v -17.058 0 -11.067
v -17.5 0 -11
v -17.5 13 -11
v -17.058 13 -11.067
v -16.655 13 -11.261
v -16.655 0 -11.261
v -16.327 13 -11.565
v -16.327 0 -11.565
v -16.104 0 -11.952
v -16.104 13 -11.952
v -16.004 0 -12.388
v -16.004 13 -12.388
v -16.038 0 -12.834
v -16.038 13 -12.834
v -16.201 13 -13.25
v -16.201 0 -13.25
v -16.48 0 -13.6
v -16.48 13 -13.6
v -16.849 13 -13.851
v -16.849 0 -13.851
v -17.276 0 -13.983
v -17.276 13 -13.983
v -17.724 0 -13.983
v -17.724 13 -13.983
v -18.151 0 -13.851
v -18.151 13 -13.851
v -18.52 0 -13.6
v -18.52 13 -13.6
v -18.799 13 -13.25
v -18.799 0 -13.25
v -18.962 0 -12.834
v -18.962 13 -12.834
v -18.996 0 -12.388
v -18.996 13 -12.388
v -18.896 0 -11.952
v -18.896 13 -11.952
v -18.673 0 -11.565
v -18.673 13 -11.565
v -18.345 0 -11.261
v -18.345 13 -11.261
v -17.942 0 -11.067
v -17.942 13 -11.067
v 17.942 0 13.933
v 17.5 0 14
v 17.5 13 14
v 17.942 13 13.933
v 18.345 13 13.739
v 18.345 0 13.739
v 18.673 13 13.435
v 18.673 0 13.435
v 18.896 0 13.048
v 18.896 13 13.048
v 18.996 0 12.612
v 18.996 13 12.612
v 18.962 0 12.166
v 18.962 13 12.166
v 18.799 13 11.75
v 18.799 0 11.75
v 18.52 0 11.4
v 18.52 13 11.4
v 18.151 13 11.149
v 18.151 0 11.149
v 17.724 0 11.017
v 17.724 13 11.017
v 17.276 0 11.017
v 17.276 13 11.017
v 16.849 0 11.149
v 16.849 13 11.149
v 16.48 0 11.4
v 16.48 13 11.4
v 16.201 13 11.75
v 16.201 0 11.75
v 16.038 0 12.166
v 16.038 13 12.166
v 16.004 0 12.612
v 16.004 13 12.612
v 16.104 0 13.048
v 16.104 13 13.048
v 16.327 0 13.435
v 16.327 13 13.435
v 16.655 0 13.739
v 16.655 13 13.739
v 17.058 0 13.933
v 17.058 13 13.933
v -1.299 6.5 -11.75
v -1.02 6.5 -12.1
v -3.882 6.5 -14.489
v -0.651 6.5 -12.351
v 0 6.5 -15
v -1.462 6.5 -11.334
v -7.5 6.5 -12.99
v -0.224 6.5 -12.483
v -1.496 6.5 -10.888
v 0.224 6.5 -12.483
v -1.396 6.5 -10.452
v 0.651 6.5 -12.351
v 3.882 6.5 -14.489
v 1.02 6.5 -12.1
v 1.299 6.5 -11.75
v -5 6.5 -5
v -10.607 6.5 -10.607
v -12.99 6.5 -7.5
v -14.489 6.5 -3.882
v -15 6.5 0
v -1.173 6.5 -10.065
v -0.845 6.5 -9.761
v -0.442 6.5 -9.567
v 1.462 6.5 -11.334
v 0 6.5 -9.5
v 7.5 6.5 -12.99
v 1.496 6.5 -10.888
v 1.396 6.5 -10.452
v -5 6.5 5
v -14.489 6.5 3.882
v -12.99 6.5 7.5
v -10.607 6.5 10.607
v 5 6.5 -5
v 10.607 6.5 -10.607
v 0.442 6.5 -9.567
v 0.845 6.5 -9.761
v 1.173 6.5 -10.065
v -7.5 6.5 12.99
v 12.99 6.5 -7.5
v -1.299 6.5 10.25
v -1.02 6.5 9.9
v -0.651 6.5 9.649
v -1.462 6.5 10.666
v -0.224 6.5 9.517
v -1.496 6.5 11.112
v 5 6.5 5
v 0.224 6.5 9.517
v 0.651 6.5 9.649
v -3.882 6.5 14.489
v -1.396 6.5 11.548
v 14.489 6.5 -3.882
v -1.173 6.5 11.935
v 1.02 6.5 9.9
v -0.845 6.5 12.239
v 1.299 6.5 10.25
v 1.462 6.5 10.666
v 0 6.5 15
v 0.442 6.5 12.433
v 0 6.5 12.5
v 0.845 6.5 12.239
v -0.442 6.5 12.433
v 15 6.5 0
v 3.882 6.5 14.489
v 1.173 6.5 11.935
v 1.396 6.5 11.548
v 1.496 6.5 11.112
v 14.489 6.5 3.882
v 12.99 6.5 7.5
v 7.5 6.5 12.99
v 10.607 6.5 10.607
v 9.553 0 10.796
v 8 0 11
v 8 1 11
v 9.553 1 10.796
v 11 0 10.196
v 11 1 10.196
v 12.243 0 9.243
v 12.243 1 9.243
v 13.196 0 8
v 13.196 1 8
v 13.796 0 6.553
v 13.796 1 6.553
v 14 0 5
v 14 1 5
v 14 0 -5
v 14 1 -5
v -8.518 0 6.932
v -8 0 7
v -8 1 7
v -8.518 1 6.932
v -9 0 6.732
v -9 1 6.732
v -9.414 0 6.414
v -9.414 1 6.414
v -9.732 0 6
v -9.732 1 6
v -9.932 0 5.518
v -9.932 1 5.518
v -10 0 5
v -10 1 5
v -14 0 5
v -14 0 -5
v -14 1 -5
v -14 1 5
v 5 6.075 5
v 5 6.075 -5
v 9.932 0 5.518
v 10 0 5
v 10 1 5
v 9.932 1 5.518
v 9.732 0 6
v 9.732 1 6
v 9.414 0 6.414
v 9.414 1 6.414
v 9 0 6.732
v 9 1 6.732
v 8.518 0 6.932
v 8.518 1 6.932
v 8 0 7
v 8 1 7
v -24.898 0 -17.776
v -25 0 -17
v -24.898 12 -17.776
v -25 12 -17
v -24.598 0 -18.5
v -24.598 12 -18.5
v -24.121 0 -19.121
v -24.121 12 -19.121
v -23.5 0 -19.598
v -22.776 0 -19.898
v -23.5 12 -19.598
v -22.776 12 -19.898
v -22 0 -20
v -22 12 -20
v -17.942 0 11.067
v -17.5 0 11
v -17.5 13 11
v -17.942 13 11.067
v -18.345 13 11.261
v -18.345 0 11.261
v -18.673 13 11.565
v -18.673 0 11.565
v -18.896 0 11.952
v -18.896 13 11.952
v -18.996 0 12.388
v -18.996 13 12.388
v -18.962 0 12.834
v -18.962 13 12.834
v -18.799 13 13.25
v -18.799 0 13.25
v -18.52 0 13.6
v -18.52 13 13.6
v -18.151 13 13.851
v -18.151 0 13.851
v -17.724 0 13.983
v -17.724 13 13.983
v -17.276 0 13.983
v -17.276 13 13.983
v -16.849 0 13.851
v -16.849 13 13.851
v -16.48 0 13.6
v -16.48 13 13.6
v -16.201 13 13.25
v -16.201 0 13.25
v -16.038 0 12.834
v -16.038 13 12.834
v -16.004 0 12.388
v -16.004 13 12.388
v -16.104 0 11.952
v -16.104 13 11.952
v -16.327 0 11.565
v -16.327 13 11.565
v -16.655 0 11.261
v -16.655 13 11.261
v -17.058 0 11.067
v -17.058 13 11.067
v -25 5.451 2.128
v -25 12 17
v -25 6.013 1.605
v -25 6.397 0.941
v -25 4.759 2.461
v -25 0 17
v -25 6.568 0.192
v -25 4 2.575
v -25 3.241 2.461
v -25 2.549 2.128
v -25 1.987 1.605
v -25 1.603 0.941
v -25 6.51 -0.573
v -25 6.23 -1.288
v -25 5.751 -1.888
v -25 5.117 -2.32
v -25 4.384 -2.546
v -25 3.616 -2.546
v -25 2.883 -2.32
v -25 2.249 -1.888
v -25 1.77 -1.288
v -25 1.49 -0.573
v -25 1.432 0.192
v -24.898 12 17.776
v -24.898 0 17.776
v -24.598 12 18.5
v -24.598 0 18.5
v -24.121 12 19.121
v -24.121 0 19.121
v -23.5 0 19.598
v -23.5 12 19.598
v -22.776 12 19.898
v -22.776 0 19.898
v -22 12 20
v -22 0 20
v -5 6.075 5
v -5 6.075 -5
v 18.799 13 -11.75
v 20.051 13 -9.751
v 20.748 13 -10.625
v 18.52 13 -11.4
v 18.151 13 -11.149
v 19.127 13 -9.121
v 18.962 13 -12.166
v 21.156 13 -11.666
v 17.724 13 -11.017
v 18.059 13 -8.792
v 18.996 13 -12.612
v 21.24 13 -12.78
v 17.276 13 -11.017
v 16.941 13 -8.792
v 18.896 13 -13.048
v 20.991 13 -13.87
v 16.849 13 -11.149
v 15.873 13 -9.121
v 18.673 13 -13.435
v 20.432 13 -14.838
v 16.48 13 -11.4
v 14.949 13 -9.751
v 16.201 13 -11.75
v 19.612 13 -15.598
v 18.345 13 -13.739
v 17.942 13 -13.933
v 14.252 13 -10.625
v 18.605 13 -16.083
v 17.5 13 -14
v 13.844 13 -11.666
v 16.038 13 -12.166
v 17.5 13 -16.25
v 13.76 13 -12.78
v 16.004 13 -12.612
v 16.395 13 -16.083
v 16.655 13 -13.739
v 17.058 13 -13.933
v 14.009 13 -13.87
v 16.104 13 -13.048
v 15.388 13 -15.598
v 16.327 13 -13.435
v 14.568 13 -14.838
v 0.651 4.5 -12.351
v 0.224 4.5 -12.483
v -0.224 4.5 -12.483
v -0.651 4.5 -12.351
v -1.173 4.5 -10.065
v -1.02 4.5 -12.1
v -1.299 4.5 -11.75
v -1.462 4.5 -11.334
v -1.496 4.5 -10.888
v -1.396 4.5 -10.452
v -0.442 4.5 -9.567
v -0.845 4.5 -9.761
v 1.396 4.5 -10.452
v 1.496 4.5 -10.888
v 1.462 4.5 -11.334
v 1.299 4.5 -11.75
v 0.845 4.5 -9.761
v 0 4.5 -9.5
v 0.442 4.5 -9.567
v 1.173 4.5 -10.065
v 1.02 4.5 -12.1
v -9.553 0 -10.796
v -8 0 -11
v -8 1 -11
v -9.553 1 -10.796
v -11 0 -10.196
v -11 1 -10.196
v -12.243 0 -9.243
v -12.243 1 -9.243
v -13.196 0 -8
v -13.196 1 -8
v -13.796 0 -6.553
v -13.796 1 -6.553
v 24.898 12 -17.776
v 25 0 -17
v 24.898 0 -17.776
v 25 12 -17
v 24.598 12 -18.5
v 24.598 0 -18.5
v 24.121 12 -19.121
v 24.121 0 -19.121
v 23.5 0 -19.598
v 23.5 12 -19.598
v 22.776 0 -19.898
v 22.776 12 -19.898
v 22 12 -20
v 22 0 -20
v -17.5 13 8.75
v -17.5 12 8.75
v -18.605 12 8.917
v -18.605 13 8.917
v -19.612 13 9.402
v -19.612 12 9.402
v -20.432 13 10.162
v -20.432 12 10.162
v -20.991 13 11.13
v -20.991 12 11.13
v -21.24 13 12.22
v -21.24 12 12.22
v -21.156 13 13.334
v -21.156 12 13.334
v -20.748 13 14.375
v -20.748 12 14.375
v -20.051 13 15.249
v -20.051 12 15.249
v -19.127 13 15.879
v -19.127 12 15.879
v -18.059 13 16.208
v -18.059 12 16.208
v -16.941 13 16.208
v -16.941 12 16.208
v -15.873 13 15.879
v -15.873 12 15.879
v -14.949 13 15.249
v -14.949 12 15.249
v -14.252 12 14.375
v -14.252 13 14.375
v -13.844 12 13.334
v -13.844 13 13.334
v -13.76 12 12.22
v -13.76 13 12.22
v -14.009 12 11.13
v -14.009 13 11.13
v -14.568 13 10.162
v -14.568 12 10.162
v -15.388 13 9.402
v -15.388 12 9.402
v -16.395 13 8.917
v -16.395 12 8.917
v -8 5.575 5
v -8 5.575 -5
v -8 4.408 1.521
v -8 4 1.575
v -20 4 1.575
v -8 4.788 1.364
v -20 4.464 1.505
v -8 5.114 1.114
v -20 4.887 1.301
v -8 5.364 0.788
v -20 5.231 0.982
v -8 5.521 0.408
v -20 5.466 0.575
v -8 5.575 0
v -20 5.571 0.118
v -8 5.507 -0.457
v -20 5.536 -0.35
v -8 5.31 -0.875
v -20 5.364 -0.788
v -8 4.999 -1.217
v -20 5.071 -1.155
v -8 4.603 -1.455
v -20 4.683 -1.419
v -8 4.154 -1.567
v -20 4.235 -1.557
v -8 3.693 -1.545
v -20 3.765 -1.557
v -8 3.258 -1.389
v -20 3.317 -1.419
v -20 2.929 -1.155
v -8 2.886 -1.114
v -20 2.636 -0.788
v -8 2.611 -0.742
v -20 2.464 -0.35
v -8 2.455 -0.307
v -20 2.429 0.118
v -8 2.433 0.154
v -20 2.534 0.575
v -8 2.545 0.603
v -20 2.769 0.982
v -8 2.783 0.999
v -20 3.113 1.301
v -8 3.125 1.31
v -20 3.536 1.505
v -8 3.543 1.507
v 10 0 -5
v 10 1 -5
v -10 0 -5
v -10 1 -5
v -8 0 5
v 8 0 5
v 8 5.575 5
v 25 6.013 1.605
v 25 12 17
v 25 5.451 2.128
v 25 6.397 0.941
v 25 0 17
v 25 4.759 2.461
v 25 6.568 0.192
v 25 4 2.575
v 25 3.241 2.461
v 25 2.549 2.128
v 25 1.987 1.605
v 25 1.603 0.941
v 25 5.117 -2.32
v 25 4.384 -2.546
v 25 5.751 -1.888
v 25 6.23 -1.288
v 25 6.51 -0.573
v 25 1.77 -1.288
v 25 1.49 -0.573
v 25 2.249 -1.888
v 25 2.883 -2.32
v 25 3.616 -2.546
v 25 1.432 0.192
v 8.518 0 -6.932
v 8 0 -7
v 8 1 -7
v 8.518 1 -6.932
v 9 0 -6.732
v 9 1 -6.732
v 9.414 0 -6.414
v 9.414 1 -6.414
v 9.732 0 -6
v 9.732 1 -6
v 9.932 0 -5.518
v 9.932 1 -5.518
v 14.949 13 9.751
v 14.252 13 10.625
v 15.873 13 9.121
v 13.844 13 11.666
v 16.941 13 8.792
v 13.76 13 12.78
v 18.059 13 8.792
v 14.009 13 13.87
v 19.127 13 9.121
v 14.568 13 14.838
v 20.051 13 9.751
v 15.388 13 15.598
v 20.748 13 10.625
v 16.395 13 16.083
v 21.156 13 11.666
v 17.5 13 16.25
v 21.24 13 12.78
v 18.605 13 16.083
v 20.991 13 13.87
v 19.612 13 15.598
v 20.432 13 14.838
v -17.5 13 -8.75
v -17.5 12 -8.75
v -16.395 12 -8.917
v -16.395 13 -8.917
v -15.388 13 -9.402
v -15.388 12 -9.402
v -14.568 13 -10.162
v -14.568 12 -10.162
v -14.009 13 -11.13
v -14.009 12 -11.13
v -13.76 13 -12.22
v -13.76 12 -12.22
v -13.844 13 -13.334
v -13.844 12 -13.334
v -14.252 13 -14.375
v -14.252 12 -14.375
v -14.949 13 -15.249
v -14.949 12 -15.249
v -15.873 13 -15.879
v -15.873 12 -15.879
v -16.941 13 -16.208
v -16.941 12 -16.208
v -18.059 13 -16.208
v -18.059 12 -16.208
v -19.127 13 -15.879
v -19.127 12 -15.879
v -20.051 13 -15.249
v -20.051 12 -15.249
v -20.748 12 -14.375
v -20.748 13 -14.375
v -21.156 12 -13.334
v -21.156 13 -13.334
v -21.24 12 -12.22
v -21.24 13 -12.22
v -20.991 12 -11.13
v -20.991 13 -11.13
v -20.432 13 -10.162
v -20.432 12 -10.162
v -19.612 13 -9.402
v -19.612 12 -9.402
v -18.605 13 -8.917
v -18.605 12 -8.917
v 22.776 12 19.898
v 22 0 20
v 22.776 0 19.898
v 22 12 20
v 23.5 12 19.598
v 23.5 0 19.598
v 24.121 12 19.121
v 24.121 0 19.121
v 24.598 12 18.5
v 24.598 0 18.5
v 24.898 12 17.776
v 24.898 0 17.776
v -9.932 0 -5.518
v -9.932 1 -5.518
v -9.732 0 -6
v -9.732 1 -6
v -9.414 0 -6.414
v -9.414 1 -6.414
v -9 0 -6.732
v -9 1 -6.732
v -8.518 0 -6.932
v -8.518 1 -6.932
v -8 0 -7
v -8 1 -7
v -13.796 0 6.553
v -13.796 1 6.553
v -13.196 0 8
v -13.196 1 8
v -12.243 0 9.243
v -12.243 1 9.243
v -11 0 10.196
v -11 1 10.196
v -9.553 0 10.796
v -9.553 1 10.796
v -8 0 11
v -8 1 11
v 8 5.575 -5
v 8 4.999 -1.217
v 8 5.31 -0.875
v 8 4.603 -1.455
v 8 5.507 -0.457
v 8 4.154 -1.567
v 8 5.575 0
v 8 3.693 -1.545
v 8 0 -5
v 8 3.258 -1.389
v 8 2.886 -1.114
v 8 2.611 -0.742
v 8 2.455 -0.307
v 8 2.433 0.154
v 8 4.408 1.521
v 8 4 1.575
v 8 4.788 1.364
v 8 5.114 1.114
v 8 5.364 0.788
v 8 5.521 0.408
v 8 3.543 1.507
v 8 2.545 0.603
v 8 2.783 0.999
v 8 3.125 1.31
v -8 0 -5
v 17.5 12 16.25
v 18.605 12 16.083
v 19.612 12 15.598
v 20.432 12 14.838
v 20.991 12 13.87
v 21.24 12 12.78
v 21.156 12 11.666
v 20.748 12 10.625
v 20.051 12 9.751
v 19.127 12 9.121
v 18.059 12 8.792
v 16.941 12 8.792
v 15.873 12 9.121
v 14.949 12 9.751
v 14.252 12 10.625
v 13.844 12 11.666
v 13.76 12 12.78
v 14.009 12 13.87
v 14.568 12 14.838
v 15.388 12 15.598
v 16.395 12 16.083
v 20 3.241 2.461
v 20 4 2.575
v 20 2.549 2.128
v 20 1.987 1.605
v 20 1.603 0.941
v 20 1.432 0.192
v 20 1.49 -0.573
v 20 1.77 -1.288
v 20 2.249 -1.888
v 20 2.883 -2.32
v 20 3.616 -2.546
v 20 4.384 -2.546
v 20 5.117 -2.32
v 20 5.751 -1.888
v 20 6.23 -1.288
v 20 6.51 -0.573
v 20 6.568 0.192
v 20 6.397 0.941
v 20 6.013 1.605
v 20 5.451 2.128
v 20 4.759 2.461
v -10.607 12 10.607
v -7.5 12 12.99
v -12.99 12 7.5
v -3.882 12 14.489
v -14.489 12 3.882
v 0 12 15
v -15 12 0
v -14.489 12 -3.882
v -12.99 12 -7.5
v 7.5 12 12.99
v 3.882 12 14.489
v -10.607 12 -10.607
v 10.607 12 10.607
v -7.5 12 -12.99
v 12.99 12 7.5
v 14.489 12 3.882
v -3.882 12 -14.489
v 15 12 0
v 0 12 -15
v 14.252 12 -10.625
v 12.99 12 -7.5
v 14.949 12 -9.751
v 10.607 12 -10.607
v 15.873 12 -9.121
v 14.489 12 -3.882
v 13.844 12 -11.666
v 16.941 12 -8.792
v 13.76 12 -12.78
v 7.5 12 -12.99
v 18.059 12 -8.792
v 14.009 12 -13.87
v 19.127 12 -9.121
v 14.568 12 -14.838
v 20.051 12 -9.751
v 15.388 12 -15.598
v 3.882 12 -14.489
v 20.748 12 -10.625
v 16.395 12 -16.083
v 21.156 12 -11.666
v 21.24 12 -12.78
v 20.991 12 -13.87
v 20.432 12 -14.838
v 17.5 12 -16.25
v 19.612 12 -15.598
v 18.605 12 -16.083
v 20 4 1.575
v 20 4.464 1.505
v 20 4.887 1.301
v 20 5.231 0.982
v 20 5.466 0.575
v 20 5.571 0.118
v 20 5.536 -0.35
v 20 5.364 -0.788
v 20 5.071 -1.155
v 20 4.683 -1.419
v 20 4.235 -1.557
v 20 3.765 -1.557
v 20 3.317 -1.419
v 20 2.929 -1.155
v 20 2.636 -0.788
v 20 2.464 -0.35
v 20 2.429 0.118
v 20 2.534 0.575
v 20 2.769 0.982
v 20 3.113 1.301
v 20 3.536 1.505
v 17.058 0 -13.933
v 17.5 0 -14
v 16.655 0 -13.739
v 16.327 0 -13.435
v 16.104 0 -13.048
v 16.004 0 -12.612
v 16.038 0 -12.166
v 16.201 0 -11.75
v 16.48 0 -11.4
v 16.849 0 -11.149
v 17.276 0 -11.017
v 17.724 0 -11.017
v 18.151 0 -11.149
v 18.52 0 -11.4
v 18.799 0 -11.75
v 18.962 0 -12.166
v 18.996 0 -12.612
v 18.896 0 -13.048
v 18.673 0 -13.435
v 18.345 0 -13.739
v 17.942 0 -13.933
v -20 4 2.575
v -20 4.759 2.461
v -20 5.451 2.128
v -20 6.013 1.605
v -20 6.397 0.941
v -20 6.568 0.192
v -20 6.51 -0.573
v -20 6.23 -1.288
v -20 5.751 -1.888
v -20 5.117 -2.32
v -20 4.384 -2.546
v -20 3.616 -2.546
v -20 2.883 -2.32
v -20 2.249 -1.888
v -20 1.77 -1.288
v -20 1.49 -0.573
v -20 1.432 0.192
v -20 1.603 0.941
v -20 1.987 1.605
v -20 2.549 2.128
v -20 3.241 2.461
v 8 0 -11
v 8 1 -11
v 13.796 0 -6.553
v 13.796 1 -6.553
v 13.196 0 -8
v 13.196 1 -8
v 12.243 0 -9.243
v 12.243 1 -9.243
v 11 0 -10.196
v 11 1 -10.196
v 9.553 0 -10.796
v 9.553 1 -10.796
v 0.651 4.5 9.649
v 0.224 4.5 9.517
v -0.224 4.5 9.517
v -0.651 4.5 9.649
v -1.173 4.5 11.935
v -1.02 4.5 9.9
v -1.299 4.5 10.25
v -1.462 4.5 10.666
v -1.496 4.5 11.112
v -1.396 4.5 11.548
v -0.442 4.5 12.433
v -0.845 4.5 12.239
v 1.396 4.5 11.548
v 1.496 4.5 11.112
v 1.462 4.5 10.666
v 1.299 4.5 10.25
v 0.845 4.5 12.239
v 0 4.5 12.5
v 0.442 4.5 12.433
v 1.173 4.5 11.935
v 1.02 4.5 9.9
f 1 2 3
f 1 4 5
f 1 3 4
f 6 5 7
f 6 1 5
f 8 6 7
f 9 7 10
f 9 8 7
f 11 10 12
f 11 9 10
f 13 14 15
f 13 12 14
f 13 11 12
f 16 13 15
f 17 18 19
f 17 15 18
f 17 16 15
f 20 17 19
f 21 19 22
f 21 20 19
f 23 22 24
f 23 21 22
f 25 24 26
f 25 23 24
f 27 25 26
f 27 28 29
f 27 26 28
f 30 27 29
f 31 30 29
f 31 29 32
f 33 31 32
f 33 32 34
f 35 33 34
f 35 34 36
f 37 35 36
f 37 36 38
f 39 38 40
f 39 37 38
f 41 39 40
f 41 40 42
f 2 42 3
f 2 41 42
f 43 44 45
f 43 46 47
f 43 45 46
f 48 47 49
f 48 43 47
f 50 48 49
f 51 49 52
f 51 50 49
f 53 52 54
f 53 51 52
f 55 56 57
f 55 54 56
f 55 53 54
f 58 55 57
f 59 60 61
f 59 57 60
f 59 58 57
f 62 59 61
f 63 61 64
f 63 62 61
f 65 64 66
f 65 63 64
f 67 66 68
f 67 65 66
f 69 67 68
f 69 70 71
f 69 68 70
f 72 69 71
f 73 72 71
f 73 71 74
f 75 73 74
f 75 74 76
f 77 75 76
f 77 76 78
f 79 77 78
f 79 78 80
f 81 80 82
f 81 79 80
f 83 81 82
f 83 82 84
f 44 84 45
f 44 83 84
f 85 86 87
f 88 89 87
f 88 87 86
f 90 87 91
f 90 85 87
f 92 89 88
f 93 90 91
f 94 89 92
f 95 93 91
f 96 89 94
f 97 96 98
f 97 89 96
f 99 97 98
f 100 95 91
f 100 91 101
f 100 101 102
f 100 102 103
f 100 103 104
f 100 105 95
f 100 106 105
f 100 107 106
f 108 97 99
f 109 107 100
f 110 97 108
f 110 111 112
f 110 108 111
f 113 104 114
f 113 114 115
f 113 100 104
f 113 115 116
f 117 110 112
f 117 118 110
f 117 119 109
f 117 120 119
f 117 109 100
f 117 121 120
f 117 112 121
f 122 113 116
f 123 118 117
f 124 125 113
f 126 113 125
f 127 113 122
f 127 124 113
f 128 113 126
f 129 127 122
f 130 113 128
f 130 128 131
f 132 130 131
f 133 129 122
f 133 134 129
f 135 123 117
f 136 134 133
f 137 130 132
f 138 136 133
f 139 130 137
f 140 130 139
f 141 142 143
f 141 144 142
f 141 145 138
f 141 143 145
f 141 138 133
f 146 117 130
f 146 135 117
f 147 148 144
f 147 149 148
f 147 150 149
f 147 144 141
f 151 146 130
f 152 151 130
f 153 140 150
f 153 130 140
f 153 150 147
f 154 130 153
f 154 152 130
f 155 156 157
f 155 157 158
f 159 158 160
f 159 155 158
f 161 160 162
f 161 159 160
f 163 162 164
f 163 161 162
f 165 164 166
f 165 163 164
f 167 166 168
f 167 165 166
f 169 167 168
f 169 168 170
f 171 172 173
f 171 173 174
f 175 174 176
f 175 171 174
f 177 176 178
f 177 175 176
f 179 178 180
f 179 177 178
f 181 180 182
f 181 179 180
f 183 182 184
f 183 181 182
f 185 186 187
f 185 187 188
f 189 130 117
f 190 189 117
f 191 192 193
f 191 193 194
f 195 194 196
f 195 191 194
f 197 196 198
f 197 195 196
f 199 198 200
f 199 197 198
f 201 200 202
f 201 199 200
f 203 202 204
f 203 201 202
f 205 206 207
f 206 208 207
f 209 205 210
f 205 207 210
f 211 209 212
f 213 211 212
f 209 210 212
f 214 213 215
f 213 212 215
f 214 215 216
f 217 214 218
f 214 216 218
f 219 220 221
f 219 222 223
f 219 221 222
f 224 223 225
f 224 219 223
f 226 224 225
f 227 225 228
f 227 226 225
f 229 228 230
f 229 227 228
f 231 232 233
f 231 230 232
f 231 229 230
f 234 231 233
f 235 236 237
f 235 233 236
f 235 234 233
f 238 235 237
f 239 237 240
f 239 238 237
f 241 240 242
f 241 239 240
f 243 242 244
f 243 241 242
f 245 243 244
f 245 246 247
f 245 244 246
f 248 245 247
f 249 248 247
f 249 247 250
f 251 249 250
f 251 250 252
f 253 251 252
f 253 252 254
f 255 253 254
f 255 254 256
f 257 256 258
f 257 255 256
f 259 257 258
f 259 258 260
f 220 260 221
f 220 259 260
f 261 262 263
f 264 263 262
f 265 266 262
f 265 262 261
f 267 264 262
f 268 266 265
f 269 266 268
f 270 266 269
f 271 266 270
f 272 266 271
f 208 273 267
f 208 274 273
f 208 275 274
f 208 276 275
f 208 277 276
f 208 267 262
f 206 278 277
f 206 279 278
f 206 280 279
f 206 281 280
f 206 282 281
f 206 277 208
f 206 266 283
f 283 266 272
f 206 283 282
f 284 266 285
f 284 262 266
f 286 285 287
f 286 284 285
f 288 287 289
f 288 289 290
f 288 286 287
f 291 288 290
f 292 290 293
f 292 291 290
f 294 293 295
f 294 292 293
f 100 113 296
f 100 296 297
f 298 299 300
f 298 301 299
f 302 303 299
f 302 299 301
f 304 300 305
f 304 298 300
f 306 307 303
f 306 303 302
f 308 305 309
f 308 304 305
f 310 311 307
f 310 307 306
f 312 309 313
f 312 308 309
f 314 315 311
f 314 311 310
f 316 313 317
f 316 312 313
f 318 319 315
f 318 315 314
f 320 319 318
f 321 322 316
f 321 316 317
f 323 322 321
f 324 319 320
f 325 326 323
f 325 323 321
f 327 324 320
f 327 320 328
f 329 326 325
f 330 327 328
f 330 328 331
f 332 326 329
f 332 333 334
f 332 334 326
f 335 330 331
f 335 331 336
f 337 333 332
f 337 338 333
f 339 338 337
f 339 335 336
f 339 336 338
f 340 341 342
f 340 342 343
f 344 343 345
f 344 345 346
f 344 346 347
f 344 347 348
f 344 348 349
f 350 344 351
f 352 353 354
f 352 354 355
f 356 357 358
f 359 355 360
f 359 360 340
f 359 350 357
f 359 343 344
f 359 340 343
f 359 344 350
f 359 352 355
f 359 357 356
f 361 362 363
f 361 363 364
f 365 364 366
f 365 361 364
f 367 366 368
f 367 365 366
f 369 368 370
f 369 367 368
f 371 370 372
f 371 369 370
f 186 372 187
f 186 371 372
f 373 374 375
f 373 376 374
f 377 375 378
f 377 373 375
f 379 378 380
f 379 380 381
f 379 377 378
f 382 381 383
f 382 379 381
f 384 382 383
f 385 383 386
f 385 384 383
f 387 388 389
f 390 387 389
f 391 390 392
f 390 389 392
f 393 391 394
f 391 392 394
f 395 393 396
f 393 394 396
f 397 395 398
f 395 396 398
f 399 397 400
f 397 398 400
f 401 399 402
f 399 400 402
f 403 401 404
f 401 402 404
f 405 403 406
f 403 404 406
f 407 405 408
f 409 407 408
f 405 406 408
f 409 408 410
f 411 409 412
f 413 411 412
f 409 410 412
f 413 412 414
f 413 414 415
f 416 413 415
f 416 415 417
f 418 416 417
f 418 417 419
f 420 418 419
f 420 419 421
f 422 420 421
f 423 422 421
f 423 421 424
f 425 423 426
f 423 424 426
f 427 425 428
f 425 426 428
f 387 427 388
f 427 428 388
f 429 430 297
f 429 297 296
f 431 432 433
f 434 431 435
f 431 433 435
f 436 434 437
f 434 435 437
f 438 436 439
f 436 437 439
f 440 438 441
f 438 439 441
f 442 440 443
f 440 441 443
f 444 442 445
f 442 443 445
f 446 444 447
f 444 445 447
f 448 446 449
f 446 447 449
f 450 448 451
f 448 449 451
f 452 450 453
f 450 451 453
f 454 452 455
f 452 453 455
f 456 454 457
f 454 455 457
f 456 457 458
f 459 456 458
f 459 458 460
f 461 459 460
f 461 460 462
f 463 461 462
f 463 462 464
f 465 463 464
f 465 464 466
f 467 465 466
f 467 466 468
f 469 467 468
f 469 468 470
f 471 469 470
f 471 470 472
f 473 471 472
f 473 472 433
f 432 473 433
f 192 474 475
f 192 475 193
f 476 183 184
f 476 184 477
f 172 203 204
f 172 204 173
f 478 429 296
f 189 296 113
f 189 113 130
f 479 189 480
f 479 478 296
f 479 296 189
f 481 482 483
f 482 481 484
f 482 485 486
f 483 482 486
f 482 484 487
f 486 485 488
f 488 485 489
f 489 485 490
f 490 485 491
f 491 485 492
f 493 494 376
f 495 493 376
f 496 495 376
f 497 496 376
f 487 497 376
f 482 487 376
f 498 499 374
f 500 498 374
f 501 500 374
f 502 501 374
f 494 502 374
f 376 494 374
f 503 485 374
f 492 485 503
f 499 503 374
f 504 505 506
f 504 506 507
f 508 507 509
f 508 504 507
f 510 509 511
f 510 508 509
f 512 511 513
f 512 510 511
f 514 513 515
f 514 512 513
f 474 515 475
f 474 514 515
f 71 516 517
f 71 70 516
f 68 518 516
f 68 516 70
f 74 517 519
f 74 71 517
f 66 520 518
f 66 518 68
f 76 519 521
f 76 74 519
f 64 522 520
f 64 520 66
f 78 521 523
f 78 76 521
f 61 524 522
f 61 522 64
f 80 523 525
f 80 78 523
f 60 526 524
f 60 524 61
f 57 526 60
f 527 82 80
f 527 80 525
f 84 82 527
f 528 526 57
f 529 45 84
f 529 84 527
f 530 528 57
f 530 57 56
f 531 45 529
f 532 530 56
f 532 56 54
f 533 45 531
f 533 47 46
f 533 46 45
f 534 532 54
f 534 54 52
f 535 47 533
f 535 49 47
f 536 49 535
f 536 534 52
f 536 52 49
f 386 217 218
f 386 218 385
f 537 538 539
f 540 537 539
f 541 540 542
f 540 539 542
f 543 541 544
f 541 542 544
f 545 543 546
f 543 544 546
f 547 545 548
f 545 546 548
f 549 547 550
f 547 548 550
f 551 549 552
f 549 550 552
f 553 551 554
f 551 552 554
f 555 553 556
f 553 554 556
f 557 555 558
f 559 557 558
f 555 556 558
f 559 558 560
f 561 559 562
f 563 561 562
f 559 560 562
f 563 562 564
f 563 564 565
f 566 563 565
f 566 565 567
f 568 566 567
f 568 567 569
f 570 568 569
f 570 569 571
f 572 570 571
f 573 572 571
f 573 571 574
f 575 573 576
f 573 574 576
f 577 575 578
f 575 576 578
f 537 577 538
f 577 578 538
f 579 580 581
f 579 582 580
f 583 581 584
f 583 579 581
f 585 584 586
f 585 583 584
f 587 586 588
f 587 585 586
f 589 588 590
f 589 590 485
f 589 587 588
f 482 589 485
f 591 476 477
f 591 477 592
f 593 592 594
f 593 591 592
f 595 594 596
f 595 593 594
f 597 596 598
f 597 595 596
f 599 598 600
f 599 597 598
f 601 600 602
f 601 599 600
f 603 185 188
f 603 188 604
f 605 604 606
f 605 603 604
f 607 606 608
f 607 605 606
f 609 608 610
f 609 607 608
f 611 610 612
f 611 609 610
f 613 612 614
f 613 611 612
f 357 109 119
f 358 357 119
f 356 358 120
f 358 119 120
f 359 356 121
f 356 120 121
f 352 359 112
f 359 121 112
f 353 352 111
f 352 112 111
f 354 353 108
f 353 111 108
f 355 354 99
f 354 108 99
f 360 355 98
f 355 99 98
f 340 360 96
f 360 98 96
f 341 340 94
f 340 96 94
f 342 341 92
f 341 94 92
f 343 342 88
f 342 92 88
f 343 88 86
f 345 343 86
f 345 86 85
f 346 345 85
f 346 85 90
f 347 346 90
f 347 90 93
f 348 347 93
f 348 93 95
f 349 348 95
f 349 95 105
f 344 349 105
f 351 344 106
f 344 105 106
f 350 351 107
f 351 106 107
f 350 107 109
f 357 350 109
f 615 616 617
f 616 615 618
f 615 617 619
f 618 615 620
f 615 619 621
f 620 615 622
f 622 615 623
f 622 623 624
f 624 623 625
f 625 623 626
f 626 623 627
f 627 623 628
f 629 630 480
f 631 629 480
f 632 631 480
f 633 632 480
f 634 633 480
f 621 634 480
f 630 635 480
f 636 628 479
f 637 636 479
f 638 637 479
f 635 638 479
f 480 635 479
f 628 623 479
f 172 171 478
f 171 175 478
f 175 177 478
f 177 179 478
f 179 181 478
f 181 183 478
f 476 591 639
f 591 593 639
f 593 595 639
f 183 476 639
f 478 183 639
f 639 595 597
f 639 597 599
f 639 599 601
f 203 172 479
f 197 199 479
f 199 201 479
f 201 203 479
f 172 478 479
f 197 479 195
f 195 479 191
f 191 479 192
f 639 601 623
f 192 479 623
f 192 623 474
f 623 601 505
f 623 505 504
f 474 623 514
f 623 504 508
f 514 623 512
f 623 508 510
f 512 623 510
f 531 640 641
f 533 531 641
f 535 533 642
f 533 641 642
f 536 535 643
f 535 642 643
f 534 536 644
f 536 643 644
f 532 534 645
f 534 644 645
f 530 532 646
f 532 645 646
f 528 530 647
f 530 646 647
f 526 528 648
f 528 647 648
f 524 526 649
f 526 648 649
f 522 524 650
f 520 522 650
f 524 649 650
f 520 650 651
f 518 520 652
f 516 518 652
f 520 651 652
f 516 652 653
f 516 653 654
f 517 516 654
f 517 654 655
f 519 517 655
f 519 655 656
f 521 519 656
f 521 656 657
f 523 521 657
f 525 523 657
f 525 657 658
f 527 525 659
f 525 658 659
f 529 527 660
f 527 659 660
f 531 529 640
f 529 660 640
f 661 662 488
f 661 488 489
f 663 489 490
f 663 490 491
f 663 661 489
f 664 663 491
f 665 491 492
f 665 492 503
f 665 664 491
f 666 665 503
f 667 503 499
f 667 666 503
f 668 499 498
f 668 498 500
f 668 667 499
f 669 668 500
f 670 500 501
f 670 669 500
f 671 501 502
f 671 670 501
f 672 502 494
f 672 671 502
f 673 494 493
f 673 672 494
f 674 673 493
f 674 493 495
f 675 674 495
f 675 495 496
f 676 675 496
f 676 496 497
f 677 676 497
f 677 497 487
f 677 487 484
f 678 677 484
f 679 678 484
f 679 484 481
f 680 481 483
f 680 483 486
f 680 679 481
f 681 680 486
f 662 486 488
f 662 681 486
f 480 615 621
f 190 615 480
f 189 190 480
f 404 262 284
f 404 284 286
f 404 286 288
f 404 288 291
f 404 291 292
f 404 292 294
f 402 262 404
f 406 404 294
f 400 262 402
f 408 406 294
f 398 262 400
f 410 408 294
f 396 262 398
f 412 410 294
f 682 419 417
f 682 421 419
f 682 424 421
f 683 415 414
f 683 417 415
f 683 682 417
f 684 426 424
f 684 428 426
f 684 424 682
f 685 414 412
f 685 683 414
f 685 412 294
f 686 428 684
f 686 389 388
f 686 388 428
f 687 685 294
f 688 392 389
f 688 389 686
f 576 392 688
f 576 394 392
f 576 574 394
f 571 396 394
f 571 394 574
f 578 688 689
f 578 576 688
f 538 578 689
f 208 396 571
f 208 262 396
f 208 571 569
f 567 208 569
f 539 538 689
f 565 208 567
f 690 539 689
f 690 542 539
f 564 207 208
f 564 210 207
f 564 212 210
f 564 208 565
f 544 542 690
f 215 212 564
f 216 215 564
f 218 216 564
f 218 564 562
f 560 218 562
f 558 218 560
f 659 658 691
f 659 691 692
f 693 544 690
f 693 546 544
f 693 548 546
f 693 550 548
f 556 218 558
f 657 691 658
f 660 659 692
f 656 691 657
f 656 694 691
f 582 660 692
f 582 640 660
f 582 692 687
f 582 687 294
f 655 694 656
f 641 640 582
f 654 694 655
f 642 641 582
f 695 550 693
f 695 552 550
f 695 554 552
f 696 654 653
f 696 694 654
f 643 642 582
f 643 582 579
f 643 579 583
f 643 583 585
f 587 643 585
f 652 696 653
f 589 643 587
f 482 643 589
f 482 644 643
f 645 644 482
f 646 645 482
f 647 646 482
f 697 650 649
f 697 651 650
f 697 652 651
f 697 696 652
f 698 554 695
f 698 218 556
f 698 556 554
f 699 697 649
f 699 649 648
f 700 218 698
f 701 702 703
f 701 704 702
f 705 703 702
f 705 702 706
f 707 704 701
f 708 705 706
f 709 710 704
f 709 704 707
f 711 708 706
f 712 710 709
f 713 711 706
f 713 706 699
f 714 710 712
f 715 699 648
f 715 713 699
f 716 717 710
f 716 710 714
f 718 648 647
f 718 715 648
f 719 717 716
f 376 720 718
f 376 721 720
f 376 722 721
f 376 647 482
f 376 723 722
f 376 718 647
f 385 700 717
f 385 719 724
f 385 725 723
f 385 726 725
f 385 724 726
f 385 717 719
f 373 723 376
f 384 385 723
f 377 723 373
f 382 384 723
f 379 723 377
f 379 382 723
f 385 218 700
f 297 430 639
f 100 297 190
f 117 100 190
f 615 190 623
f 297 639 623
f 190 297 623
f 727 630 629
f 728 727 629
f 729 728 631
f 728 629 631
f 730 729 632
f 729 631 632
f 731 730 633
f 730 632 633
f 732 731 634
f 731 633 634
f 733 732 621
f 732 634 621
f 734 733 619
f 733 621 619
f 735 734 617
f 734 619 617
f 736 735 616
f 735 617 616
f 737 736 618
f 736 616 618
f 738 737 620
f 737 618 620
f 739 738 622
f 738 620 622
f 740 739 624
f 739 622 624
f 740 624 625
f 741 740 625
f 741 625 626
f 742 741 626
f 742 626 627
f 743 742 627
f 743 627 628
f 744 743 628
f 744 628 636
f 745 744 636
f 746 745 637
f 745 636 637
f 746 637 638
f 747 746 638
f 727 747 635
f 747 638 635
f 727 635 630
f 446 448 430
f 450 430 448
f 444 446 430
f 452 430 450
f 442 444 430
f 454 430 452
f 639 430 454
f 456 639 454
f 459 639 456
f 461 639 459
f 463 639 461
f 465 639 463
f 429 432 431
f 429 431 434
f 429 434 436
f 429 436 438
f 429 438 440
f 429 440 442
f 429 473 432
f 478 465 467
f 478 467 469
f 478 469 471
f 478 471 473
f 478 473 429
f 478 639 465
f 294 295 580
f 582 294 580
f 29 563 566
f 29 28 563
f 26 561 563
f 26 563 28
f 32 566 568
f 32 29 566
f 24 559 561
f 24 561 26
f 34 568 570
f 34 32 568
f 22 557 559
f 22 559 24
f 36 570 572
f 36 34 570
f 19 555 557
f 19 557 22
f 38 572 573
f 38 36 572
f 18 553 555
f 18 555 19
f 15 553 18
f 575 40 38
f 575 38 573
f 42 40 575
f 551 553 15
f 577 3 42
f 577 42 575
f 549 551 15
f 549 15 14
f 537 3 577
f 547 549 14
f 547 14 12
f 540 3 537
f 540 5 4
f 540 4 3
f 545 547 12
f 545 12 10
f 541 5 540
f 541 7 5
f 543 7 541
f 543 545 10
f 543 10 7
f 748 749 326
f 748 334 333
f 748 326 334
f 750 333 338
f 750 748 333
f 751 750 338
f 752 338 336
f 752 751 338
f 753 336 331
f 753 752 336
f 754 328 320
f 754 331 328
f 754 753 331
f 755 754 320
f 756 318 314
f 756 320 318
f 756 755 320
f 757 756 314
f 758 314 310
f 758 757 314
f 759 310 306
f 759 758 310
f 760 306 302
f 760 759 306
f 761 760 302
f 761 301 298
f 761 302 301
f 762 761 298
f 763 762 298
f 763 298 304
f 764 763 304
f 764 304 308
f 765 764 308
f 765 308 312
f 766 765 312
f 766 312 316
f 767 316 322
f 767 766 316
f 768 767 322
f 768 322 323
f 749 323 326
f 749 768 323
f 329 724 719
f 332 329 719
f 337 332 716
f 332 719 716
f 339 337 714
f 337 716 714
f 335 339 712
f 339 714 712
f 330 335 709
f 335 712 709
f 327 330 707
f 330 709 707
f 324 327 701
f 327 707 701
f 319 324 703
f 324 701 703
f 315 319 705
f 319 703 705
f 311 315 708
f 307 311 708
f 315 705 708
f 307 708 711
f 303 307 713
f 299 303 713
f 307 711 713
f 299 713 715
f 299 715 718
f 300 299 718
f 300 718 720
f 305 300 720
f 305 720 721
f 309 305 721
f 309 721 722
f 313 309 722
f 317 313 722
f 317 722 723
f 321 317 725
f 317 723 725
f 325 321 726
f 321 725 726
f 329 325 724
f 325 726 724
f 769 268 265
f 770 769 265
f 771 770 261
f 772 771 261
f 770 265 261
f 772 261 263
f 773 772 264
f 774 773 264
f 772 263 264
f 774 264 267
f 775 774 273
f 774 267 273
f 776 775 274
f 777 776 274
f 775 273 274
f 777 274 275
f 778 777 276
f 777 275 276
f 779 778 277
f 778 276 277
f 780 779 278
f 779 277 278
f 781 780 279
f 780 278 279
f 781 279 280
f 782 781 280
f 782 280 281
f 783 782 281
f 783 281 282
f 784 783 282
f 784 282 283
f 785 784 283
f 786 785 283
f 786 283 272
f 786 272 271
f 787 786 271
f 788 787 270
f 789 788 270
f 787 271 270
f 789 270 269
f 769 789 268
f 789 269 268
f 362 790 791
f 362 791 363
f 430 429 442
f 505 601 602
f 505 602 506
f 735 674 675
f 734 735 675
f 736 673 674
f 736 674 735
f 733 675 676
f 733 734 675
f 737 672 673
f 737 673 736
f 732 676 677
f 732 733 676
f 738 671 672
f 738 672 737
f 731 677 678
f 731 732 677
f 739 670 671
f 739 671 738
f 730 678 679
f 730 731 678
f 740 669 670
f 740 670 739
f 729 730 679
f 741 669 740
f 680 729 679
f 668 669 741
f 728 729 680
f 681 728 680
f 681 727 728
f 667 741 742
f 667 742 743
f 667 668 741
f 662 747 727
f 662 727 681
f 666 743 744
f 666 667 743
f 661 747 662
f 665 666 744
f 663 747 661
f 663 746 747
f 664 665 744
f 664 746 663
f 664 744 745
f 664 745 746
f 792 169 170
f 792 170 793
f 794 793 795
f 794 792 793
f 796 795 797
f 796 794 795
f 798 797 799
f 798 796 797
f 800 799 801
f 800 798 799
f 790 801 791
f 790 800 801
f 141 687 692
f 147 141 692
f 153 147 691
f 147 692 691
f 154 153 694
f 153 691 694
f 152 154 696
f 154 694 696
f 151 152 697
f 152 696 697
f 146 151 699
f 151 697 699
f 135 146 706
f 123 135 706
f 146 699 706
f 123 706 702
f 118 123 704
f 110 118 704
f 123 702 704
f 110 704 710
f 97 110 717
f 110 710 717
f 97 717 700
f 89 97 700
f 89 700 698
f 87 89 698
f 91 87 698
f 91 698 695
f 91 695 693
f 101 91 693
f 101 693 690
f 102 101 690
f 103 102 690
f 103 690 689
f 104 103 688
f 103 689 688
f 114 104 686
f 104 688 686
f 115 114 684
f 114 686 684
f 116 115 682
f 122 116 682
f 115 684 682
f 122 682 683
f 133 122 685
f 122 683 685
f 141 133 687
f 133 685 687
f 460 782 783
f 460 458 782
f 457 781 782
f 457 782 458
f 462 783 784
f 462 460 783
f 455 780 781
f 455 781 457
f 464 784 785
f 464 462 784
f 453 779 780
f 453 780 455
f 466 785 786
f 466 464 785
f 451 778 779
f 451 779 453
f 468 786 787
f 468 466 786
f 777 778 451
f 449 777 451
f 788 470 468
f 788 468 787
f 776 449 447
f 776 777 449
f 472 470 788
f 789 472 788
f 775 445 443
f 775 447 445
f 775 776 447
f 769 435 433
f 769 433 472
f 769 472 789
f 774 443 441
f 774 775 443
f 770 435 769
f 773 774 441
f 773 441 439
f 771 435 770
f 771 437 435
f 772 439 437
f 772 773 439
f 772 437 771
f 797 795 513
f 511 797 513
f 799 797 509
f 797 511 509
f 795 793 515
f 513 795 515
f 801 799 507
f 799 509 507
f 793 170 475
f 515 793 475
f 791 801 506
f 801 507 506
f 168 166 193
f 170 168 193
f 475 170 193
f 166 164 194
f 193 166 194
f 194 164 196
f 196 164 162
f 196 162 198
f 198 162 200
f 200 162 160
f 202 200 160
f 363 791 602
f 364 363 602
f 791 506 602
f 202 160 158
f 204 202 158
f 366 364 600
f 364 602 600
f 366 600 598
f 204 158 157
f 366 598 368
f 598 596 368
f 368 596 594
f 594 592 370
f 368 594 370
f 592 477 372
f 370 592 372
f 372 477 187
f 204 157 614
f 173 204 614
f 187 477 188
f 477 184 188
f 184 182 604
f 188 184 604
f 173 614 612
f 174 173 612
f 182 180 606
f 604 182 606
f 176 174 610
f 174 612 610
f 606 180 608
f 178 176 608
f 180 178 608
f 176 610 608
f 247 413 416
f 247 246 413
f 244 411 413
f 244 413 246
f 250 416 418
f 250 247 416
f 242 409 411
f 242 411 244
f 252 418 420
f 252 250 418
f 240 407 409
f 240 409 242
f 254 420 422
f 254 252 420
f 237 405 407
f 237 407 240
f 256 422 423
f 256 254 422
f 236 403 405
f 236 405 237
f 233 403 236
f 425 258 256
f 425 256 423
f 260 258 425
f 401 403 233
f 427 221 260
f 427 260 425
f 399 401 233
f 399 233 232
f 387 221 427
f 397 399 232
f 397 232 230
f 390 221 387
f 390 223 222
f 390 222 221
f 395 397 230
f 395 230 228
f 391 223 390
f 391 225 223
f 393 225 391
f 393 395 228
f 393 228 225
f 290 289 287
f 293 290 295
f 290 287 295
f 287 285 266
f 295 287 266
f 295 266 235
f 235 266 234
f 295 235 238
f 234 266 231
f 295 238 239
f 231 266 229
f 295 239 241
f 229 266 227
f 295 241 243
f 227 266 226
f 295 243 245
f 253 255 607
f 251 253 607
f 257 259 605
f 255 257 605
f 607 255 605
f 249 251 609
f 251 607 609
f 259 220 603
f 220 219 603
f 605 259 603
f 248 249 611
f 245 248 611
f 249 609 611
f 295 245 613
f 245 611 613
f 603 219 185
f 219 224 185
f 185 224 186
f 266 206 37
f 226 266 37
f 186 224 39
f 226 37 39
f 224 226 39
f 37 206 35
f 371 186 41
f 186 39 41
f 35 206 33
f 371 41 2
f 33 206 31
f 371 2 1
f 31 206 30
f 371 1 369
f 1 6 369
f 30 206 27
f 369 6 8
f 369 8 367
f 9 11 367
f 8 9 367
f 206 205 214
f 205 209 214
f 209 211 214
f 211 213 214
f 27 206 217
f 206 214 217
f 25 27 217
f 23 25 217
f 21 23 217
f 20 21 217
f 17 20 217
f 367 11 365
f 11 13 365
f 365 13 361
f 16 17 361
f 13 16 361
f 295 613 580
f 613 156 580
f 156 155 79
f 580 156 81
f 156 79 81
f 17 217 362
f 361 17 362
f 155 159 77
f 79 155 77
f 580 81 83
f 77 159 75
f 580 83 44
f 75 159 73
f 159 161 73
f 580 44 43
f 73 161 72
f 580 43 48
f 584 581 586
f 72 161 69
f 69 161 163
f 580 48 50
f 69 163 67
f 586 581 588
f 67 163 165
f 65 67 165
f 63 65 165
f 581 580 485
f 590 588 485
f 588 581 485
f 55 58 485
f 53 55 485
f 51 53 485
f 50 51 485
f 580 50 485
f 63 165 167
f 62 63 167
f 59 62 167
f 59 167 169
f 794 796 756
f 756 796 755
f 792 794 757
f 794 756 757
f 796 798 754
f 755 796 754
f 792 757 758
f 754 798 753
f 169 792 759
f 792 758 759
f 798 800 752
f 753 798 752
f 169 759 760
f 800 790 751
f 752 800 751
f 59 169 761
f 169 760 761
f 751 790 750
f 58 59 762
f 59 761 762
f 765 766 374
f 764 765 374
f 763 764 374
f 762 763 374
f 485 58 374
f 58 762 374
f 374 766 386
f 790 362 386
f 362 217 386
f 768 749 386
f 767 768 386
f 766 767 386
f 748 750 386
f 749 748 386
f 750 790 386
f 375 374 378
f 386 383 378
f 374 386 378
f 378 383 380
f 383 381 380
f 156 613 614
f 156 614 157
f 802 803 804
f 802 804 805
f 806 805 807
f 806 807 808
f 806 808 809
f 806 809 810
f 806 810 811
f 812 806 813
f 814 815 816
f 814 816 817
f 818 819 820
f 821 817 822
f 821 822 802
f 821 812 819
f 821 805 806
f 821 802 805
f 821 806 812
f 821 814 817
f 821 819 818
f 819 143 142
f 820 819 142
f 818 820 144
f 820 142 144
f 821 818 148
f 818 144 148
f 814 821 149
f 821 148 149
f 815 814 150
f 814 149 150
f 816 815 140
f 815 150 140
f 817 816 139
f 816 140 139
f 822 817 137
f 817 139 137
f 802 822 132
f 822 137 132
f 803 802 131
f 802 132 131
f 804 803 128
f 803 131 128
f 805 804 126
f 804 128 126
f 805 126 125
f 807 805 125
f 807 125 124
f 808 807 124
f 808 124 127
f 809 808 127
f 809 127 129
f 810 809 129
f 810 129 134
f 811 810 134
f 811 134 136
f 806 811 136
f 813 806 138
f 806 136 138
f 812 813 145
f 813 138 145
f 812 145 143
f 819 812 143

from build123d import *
from OCP.BRepFilletAPI import BRepFilletAPI_MakeChamfer

# Parameters (mm, degrees)
SKETCH1_W           = 50
SKETCH1_H           = 40
BODY_DEPTH          = 12
FILLETBODY_R        = 3
SKETCH3_R           = 3.75
BOLT_EXTRUDE_DEPTH  = 1
BOLT_DEPTH          = 10
BOLT_DEPTH_BACK     = 16
SKETCH4_R           = 1.5
SKETCH41_R          = 1.575
CHANNEL1_DEPTH      = 57
SKETCH42_R          = 2.575
INLET_DEPTH         = 5
OUTLET_START        = -5
SKETCH43_R          = 2.575
OUTLET_DEPTH        = 5
SKETCH44_R          = 15
WINDOW_DEPTH        = 5.5
SKETCH45_W          = 16
SKETCH45_H          = 10
FLOWCH_DEPTH        = 5.575
SKETCH46_W          = 10
SKETCH46_H          = 10
WINDOW_HOLE_DEPTH   = 16
SKETCH49_R          = 1.5
FIXHOLES_DEPTH      = 2
GASKET_DEPTH        = 1
CHAMFER_FLOW_SIZE   = 0.5
CHAMFER_FLOW_SIZE_2 = 3


with BuildPart() as part:
    # Sketch1 → Body (new body)
    with BuildSketch(Plane(origin=(0, 0, 0), x_dir=(1, 0, 0), z_dir=(0, 1, 0))):
        Rectangle(SKETCH1_W, SKETCH1_H)
    extrude(amount=BODY_DEPTH)

    # FilletBody
    filletbody_edges = [part.edges().sort_by_distance(p)[0] for p in [
        (-25, 6, -20),
        (25, 6, -20),
        (25, 6, 20),
        (-25, 6, 20),
    ]]
    fillet(filletbody_edges, radius=FILLETBODY_R)

    # Sketch3 → Bolt extrude (add)
    with BuildSketch(Plane(origin=(0, 12, 0), x_dir=(1, 0, 0), z_dir=(0, 1, 0))):
        with Locations(Location((-17.5, 12.5, 0), (0, 0, 270))):
            Circle(SKETCH3_R)
        with Locations(Location((17.5, 12.5, 0), (0, 0, 90))):
            Circle(SKETCH3_R)
        with Locations(Location((17.5, -12.5, 0), (0, 0, 270))):
            Circle(SKETCH3_R)
        with Locations(Location((-17.5, -12.5, 0), (0, 0, 90))):
            Circle(SKETCH3_R)
    extrude(amount=BOLT_EXTRUDE_DEPTH)

    # Sketch4 → Bolt (cut, two sides: drawn at the far end of the back side and taken through both)
    with BuildSketch(Plane(origin=(0, 13, 0), x_dir=(1, 0, 0), z_dir=(0, 1, 0)).offset(-BOLT_DEPTH_BACK)):
        with Locations(Location((-17.5, 12.5, 0), (0, 0, 270))):
            Circle(SKETCH4_R)
        with Locations(Location((17.5, 12.5, 0), (0, 0, 90))):
            Circle(SKETCH4_R)
        with Locations(Location((17.5, -12.5, 0), (0, 0, 270))):
            Circle(SKETCH4_R)
        with Locations(Location((-17.5, -12.5, 0), (0, 0, 90))):
            Circle(SKETCH4_R)
    extrude(amount=BOLT_DEPTH + BOLT_DEPTH_BACK, mode=Mode.SUBTRACT)

    # Sketch41 → Channel1 (cut)
    with BuildSketch(Plane.ZY.offset(25)):
        with Locations((0, 4)):
            Circle(SKETCH41_R)
    extrude(amount=-CHANNEL1_DEPTH, mode=Mode.SUBTRACT)

    # Sketch42 → Inlet (cut)
    with BuildSketch(Plane.ZY.offset(25)):
        with Locations((0, 4)):
            Circle(SKETCH42_R)
    extrude(amount=-INLET_DEPTH, mode=Mode.SUBTRACT)

    # Sketch43 → Outlet (cut)
    with BuildSketch(Plane(origin=(25, 0, 0), x_dir=(0, 0, -1), z_dir=(1, 0, 0)).offset(OUTLET_START)):
        with Locations(Location((0, 4, 0), (0, 0, 180))):
            Circle(SKETCH43_R)
    extrude(amount=OUTLET_DEPTH, mode=Mode.SUBTRACT)

    # Sketch44 → Window (cut)
    with BuildSketch(Plane(origin=(0, 12, 0), x_dir=(1, 0, 0), z_dir=(0, 1, 0))):
        with Locations(Location((0, 0, 0), (0, 0, 270))):
            Circle(SKETCH44_R)
    extrude(amount=-WINDOW_DEPTH, mode=Mode.SUBTRACT)

    # Sketch45 → FlowCh (cut)
    with BuildSketch(Plane.XZ):
        Rectangle(SKETCH45_W, SKETCH45_H)
    extrude(amount=-FLOWCH_DEPTH, mode=Mode.SUBTRACT)

    # Sketch46 → Window_hole (cut)
    with BuildSketch(Plane(origin=(0, 6.5, 0), x_dir=(1, 0, 0), z_dir=(0, 1, 0))):
        Rectangle(SKETCH46_W, SKETCH46_H)
    extrude(amount=-WINDOW_HOLE_DEPTH, mode=Mode.SUBTRACT)

    # Sketch49 → FixHoles (cut)
    with BuildSketch(Plane(origin=(0, 6.5, 0), x_dir=(1, 0, 0), z_dir=(0, 1, 0))):
        with Locations(Location((0, 11, 0), (0, 0, 270))):
            Circle(SKETCH49_R)
        with Locations(Location((0, -11, 0), (0, 0, 270))):
            Circle(SKETCH49_R)
    extrude(amount=-FIXHOLES_DEPTH, mode=Mode.SUBTRACT)

    # Sketch50 → Gasket (cut)
    with BuildSketch(Plane.XZ):
        with BuildLine():
            ThreePointArc((8, 11), (12.242640687, 9.242640687), (14, 5))
            Line((14, 5), (14, -5))
            ThreePointArc((14, -5), (12.242640687, -9.242640687), (8, -11))
            Line((8, -11), (-8, -11))
            ThreePointArc((-8, -11), (-12.242640687, -9.242640687), (-14, -5))
            Line((-14, -5), (-14, 5))
            ThreePointArc((-14, 5), (-12.242640687, 9.242640687), (-8, 11))
            Line((-8, 11), (8, 11))
        make_face()
        with BuildLine():
            Line((-8, -7), (8, -7))
            ThreePointArc((8, -7), (9.414213562, -6.414213562), (10, -5))
            Line((10, -5), (10, 5))
            ThreePointArc((10, 5), (9.414213562, 6.414213562), (8, 7))
            Line((8, 7), (-8, 7))
            ThreePointArc((-8, 7), (-9.414213562, 6.414213562), (-10, 5))
            Line((-10, 5), (-10, -5))
            ThreePointArc((-10, -5), (-9.414213562, -6.414213562), (-8, -7))
        make_face(mode=Mode.SUBTRACT)
    extrude(amount=-GASKET_DEPTH, mode=Mode.SUBTRACT)

    # Chamfer_flow
    chamfer_flow_edges_1 = [part.edges().sort_by_distance(p)[0] for p in [
        (5, 5.575, 0),
    ]]
    chamfer_flow_side_1 = [part.faces().sort_by_distance(p)[0] for p in [
        (5, 5.585, 0),
    ]]
    chamfer_flow_edges_2 = [part.edges().sort_by_distance(p)[0] for p in [
        (-5, 5.575, 0),
    ]]
    chamfer_flow_side_2 = [part.faces().sort_by_distance(p)[0] for p in [
        (-5, 5.585, 0),
    ]]
    chamfer_flow = BRepFilletAPI_MakeChamfer(part.part.solid().wrapped)
    for e in chamfer_flow_edges_1:
        chamfer_flow.Add(CHAMFER_FLOW_SIZE - 0.0001, CHAMFER_FLOW_SIZE_2 - 0.0001, e.wrapped, chamfer_flow_side_1[0].wrapped)
    for e in chamfer_flow_edges_2:
        chamfer_flow.Add(CHAMFER_FLOW_SIZE - 0.0001, CHAMFER_FLOW_SIZE_2 - 0.0001, e.wrapped, chamfer_flow_side_2[0].wrapped)
    add(Compound.cast(chamfer_flow.Shape()), mode=Mode.REPLACE)  # a hair under: the kernel refuses the full size


solid = part.part
